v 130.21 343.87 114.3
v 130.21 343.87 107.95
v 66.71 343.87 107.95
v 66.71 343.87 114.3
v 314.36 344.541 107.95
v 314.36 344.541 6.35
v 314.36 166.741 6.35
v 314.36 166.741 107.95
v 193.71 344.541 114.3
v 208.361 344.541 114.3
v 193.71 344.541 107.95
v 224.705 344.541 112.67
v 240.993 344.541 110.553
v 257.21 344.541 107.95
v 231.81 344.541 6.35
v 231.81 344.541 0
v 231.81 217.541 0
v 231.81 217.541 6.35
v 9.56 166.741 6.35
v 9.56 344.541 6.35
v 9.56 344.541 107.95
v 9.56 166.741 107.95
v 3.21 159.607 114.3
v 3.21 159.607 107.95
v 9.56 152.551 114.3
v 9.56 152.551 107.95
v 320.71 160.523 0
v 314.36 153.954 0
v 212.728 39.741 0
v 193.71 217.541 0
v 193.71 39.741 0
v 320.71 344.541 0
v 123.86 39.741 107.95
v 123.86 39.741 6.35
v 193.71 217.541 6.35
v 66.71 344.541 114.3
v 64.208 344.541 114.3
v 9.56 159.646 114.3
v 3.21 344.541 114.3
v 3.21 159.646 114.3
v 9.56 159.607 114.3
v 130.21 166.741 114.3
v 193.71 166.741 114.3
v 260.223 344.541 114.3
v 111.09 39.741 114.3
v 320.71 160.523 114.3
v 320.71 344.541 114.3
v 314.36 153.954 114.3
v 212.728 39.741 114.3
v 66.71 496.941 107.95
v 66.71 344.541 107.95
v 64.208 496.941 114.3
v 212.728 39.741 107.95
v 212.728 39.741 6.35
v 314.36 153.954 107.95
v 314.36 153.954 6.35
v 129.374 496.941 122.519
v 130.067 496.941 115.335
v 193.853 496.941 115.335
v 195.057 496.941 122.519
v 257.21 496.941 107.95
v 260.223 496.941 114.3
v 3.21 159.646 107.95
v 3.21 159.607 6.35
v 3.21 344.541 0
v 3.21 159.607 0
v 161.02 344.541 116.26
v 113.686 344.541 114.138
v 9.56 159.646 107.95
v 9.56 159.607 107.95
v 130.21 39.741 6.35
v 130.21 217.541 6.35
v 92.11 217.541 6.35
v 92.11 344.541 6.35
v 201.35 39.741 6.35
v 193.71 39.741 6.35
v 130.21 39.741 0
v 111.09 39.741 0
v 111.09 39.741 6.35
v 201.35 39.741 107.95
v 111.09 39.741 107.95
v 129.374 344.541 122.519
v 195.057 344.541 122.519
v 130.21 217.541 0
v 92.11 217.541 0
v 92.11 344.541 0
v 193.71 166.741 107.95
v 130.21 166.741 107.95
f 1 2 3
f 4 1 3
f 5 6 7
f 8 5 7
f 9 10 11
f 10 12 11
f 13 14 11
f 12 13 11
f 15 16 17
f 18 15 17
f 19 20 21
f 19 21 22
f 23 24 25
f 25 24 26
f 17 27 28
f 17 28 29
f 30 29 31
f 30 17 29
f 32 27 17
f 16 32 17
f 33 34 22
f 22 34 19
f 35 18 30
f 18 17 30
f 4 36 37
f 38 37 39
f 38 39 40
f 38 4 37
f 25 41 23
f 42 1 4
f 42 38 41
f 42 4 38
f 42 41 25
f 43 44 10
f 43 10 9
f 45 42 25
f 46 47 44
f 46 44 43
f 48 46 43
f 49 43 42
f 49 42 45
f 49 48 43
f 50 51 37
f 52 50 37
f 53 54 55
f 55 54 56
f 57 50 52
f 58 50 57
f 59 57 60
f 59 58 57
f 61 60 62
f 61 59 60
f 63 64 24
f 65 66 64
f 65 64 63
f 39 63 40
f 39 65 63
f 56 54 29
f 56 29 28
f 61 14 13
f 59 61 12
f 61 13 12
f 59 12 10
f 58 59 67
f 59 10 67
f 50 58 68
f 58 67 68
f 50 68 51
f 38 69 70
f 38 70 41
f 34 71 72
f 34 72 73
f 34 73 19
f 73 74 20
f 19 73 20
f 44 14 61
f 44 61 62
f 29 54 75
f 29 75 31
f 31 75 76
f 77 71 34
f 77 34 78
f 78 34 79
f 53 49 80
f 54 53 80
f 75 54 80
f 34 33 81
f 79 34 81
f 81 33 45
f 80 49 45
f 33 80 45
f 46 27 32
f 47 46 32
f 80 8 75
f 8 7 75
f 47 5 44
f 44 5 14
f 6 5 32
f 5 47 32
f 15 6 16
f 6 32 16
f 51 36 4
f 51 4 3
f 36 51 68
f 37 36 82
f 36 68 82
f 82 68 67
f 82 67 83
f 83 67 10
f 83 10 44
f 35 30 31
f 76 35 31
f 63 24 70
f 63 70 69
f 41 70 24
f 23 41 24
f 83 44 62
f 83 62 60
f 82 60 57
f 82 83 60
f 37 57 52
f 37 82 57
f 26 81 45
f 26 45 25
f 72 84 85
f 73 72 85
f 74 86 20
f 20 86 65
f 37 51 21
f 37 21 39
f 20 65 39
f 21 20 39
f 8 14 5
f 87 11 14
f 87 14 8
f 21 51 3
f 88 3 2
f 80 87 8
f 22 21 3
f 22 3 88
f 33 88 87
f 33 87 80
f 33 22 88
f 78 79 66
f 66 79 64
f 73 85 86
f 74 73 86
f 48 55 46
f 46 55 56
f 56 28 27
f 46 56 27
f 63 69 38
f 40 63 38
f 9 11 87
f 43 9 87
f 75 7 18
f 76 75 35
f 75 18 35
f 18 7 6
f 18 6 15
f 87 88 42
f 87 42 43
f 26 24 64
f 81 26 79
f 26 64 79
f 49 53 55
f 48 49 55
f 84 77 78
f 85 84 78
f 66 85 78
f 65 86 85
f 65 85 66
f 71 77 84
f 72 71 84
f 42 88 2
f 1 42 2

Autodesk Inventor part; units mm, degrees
ref_plane "YZ Plane" through (0, 0, 0) normal (1, 0, 0) x (0, 1, 0)
ref_plane "XZ Plane" through (0, 0, 0) normal (0, 1, 0) x (-1, 0, 0)
ref_plane "XY Plane" through (0, 0, 0) normal (0, 0, 1) x (1, 0, 0)
sketch "Sketch1" plane through (0, 0, 0) normal (0, 0, 1) x (1, 0, 0)
  line L0 (9.560424, 344.540635) -> (9.560424, 166.740635)
  line L1 (9.560424, 166.740635) -> (123.860424, 39.740635)
  line L2 (123.860424, 39.740635) -> (130.210424, 39.740635)
  line L3 (130.210424, 39.740635) -> (130.210424, 217.540635)
  line L4 (130.210424, 217.540635) -> (92.110424, 217.540635)
  line L5 (92.110424, 217.540635) -> (92.110424, 344.540635)
  line L6 (92.110424, 344.540635) -> (9.560424, 344.540635)
  line L7 (193.710424, 217.540635) -> (193.710424, 39.740635)
  line L8 (193.710424, 39.740635) -> (200.060424, 39.740635)
  line L9 (200.060424, 39.740635) -> (314.360424, 166.740635)
  line L10 (314.360424, 166.740635) -> (314.360424, 344.540635)
  line L11 (314.360424, 344.540635) -> (231.810424, 344.540635)
  line L12 (231.810424, 344.540635) -> (231.810424, 217.540635)
  line L13 (231.810424, 217.540635) -> (193.710424, 217.540635)
  point P0 (0, 0)
  dimension "d0" = 127
  dimension "d1" = 38.1
  dimension "d2" = 177.8
  dimension "d3" = 127
  dimension "d4" = 82.55
  dimension "d5" = 6.35
  dimension "d9" = 63.5
  dimension "d10" = 38.1
  dimension "d11" = 82.55
  dimension "d12" = 6.35
  dimension "d13" = 177.8
  dimension "d14" = 170.86103
  dimension "d15" = 127
  dimension "d16" = 177.8
extrude "Extrusion1" add sketch "Sketch1" along normal blind 6.35
sketch "Sketch2" plane through (0, 0, 6.35) normal (0, 0, 1) x (1, 0, 0)
  line L0 (9.560424, 166.740635) -> (123.860424, 39.740635)
  line L1 (9.560424, 166.740635) -> (123.860424, 39.740635)
  line L2 (123.860424, 39.740635) -> (116.804868, 33.390635)
  line L3 (116.804868, 33.390635) -> (2.504868, 160.390635)
  line L4 (2.504868, 160.390635) -> (9.560424, 166.740635)
  line L5 (314.360424, 166.740635) -> (201.350031, 39.740635)
  line L6 (201.350031, 39.740635) -> (207.700031, 34.090115)
  line L7 (207.700031, 34.090115) -> (320.710424, 161.090115)
  line L8 (320.710424, 161.090115) -> (314.360424, 166.740635)
  line L9 (9.560424, 166.740635) -> (3.210424, 166.740635)
  line L10 (3.210424, 166.740635) -> (3.210424, 369.270371)
  line L11 (3.210424, 369.270371) -> (9.560424, 369.270371)
  line L12 (9.560424, 369.270371) -> (9.560424, 166.740635)
  line L13 (314.360424, 166.740635) -> (314.360424, 344.540635)
  line L14 (314.360424, 344.540635) -> (320.710424, 344.540635)
  line L15 (320.710424, 344.540635) -> (320.710424, 141.340635)
  line L16 (320.710424, 141.340635) -> (314.360424, 141.340635)
  line L17 (314.360424, 141.340635) -> (314.360424, 344.540635)
  point P0 (0, 0)
  dimension "d17" = 6.35
  dimension "d18" = 6.35
  dimension "d19" = 6.35
  dimension "d20" = 6.35
sketch "Sketch2 outline for Extrusion2" plane through (0, 0, 6.35) normal (0, 0, 1) x (1, 0, 0)
  line L0 (3.210424, 166.740635) -> (9.560424, 166.740635)
  line L1 (3.210424, 369.270371) -> (3.210424, 166.740635)
  line L2 (9.560424, 369.270371) -> (3.210424, 369.270371)
  line L3 (9.560424, 166.740635) -> (9.560424, 369.270371)
  line L4 (320.710424, 344.540635) -> (314.360424, 344.540635)
  line L5 (314.360424, 344.540635) -> (314.360424, 166.740635)
  line L6 (314.360424, 166.740635) -> (201.350031, 39.740635)
  line L7 (201.350031, 39.740635) -> (207.700031, 34.090115)
  line L8 (207.700031, 34.090115) -> (314.360424, 153.954046)
  line L9 (314.360424, 153.954046) -> (314.360424, 141.340635)
  line L10 (314.360424, 141.340635) -> (320.710424, 141.340635)
  line L11 (320.710424, 141.340635) -> (320.710424, 344.540635)
  line L12 (123.860424, 39.740635) -> (9.560424, 166.740635)
  line L13 (116.804868, 33.390635) -> (123.860424, 39.740635)
  line L14 (2.504868, 160.390635) -> (116.804868, 33.390635)
  line L15 (9.560424, 166.740635) -> (2.504868, 160.390635)
extrude "Extrusion2" add sketch "Sketch2 outline for Extrusion2" along normal blind 101.6
sketch "Sketch4" plane through (0, 0, 0) normal (0, 0, -1) x (-1, 0, 0)
  line L0 (-193.710424, 39.740635) -> (-200.060424, 39.740635)
  line L1 (-193.710424, 39.740635) -> (-216.217025, 39.740635)
  line L2 (-216.217025, 39.740635) -> (-216.217025, 32.649574)
  line L3 (-216.217025, 32.649574) -> (-193.710424, 32.649574)
  line L4 (-193.710424, 32.649574) -> (-193.710424, 39.740635)
  line L5 (-123.860424, 39.740635) -> (-130.210424, 39.740635)
  line L6 (-130.210424, 39.740635) -> (-108.923155, 39.740635)
  line L7 (-108.923155, 39.740635) -> (-108.923155, 31.510409)
  line L8 (-108.923155, 31.510409) -> (-130.210424, 31.510409)
  line L9 (-130.210424, 31.510409) -> (-130.210424, 39.740635)
  point P0 (0, 0)
  point P1 (-200.060424, 14.340635)
  point P2 (-123.860424, 14.340635)
extrude "Extrusion4" cut sketch "Sketch4" against normal blind 114.3
sketch "Sketch5" plane through (0, 0, 107.95) normal (0, 0, 1) x (1, 0, 0)
  line L0 (3.210424, 141.340635) -> (3.210424, 343.870371)
  line L1 (3.210424, 343.870371) -> (130.210424, 343.870371)
  line L2 (92.110424, 344.540635) -> (9.560424, 344.540635)
  line L3 (130.210424, 39.740635) -> (130.210424, 217.540635)
  line L4 (130.210424, 343.870371) -> (130.210424, 39.740635)
  line L5 (123.860424, 39.740635) -> (130.210424, 39.740635)
  line L6 (130.210424, 14.340635) -> (111.089868, 14.340635)
  line L7 (111.089868, 14.340635) -> (2.504868, 134.990635)
  line L8 (111.089868, 14.340635) -> (2.504868, 134.990635)
  line L9 (2.504868, 134.990635) -> (3.210424, 141.340635)
  line L10 (193.710424, 39.740635) -> (193.710424, 344.540635)
  line L11 (193.710424, 344.540635) -> (320.710424, 344.540635)
  line L12 (320.710424, 141.340635) -> (320.710424, 344.540635)
  line L13 (320.710424, 344.540635) -> (320.710424, 141.340635)
  line L14 (314.360424, 344.540635) -> (314.360424, 141.340635)
  line L15 (320.710424, 135.690115) -> (314.360424, 141.340635)
  line L16 (320.710424, 141.340635) -> (320.710424, 135.690115)
  line L17 (320.710424, 135.690115) -> (235.3302, 39.740635)
  line L18 (235.3302, 39.740635) -> (193.710424, 39.740635)
  point P0 (0, 0)
sketch "Sketch5 outline for Extrusion5" plane through (0, 0, 107.95) normal (0, 0, 1) x (1, 0, 0)
  line L0 (193.710424, 344.540635) -> (193.710424, 39.740635)
  line L1 (193.710424, 39.740635) -> (235.3302, 39.740635)
  line L2 (235.3302, 39.740635) -> (320.710424, 135.690115)
  line L3 (320.710424, 135.690115) -> (320.710424, 344.540635)
  line L4 (320.710424, 344.540635) -> (193.710424, 344.540635)
  line L5 (3.210424, 343.870371) -> (3.210424, 141.340635)
  line L6 (130.210424, 343.870371) -> (3.210424, 343.870371)
  line L7 (130.210424, 39.740635) -> (130.210424, 343.870371)
  line L8 (111.089868, 14.340635) -> (130.210424, 39.740635)
  line L9 (2.504868, 134.990635) -> (111.089868, 14.340635)
  line L10 (3.210424, 141.340635) -> (2.504868, 134.990635)
extrude "Extrusion5" add sketch "Sketch5 outline for Extrusion5" along normal blind 6.35
sketch "Sketch6" plane through (193.710424, 39.740635, 107.95) normal (-1, 0, 0) x (0, 0, 1)
  line L0 (0, 304.8) -> (0, 0) projected
  line L1 (6.35, 0) -> (-101.6, 0) projected
  line L2 (0, 101.6) -> (6.35, 101.6)
  line L3 (6.35, 101.6) -> (6.35, 0)
  line L4 (6.35, 0) -> (0, 0)
  line L5 (0, 0) -> (0, 101.6)
  point P0 (-107.95, -39.740635)
  point P1 (-107.95, 0)
  dimension "d29" = 101.6
extrude "Extrusion6" add sketch "Sketch6" along normal blind 63.5
sketch "Sketch7" plane through (0, 0, 0) normal (0, 0, -1) x (-1, 0, 0)
  line L0 (-3.210424, 343.870371) -> (-3.210424, 141.340635)
  line L1 (-3.210424, 147.802494) -> (-9.560424, 147.802494)
  line L2 (-9.560424, 147.802494) -> (-9.560424, 134.679374)
  line L3 (-9.560424, 134.679374) -> (-3.210424, 134.679374)
  line L4 (-3.210424, 134.679374) -> (-3.210424, 147.802494)
  line L5 (-314.360424, 166.740635) -> (-201.350031, 39.740635)
  line L6 (-320.714268, 135.664797) -> (-320.714268, 145.552556)
  line L7 (-320.738877, 135.664797) -> (-314.360424, 135.664797)
  line L8 (-314.360424, 135.664797) -> (-314.360424, 145.552556)
  line L9 (-314.360424, 166.740635) -> (-314.360424, 344.540635)
  line L10 (-320.714268, 145.552556) -> (-314.360424, 145.552556)
  line L11 (-320.738877, 135.664797) -> (-314.360424, 135.664797)
  line L12 (-314.360424, 135.664797) -> (-314.360424, 145.552556)
  line L13 (-314.360424, 145.552556) -> (-320.738877, 145.552556)
  line L14 (-320.738877, 145.552556) -> (-320.738877, 135.664797)
  point P0 (0, 0)
  point P1 (-309.309804, 161.064797)
  point P2 (-314.360424, 141.340635)
  point P3 (-201.350031, 39.740635)
sketch "Sketch8" plane through (0, 0, 0) normal (0, 0, -1) x (-1, 0, 0)
  line L0 (-3.210424, 141.340635) -> (-3.210424, 343.870371)
  line L1 (-3.210424, 141.825243) -> (-1.362602, 141.825243)
  line L2 (-1.362602, 141.825243) -> (-1.362602, 134.146464)
  line L3 (-1.362602, 134.146464) -> (-3.210424, 134.146464)
  line L4 (-3.210424, 134.146464) -> (-3.210424, 141.825243)
  point P0 (0, 0)
  point P1 (-3.210424, 135.625635)
extrude "Extrusion8" cut sketch "Sketch8" against normal blind 114.3
sketch "Sketch10" plane through (231.810424, 344.540635, 0) normal (0, 1, 0) x (1, 0, 0)
  line L0 (88.9, -114.3) -> (-38.1, -114.3)
  line L1 (-101.6, -114.3) -> (-228.6, -114.3)
  line L2 (-101.6, -107.95) -> (-222.25, -107.95)
  line L3 (82.55, -107.95) -> (-30.460392, -107.95)
  arc A0 (-165.1, -107.95) -> (25.4, -107.95) centre (-69.85, 433.719551) ccw
  line L4 (88.9, -6.35) -> (88.9, -114.3)
  line L5 (-228.6, -107.95) -> (-228.6, -114.3)
  line L6 (-165.1, -107.95) -> (-167.602477, -114.3)
  line L7 (25.4, -107.95) -> (28.412743, -114.3)
  line L8 (3.519776, -114.3) -> (88.9, -114.3)
  arc A1 (-167.602477, -114.3) -> (28.412743, -114.3) centre (-69.594867, 400.309912) ccw
  point P0 (-231.810424, 0)
  point P1 (-165.1, -114.3)
  point P2 (25.4, -114.3)
  point P3 (77.518866, -107.95)
  point P4 (88.9, 0)
  point P5 (-228.6, 0)
  point P6 (88.896956, -114.3)
  dimension "d38" = 190.5
  dimension "d39" = 63.5
  dimension "d40" = 63.5
  dimension "d44" = 63.5
  dimension "d45" = 63.5
extrude "Extrusion10" add sketch "Sketch10" along normal blind 152.4
extrude "Extrusion11" add sketch "Sketch7" against normal blind 114.3
sketch "Sketch11" plane through (193.710424, 141.340635, 114.3) normal (0, 1, 0) x (1, 0, 0)
  line L0 (0, 6.35) -> (0, 0)
  line L1 (-63.505152, 0) -> (0, 0)
  line L2 (0, 0) -> (0, 6.35)
  line L3 (0, 6.35) -> (-63.505152, 6.35)
  line L4 (-63.505152, 6.35) -> (-63.505152, 0)
  line L5 (0, 0) -> (-63.5, 0)
  point P0 (-193.710424, 114.3)
extrude "Extrusion12" add sketch "Sketch11" along normal blind 25.4
sketch "Sketch12" plane through (0, 0, 107.95) normal (0, 0, 1) x (1, 0, 0)
  line L0 (130.210424, 343.870371) -> (9.560424, 343.870371)
  line L1 (3.210424, 369.270371) -> (3.210424, 166.740635)
  line L2 (9.560424, 343.870371) -> (3.210424, 343.870371)
  line L3 (3.210424, 343.870371) -> (3.210424, 369.270371)
  line L4 (3.210424, 369.270371) -> (9.560424, 369.270371)
  line L5 (9.560424, 369.270371) -> (9.560424, 343.870371)
  point P0 (0, 0)
extrude "Extrusion13" cut sketch "Sketch12" against normal blind 114.3
sketch "Sketch13" plane through (3.210424, 166.740635, 6.35) normal (-1, 0, 0) x (0, 0, 1)
  line L0 (107.95, -32.533951) -> (107.95, -152.4)
  line L1 (-6.35, -18.909661) -> (107.95, -18.909661)
  line L2 (107.95, -18.909661) -> (107.95, -32.533951)
  line L3 (107.95, -32.533951) -> (-6.35, -32.533951)
  line L4 (-6.35, -32.533951) -> (-6.35, -18.909661)
  line L5 (101.6, -127) -> (101.6, 0)
  line L6 (101.6, 0) -> (107.95, 0)
  line L7 (107.95, 0) -> (107.95, -18.909661)
  line L8 (107.95, -18.909661) -> (101.6, -18.909661)
  line L9 (101.6, -18.909661) -> (101.6, 0)
  point P0 (-6.35, -166.740635)
extrude "Extrusion14" cut sketch "Sketch13" against normal blind 6.35
sketch "Sketch14" plane through (0, 0, 107.95) normal (0, 0, -1) x (-1, 0, 0)
  line L0 (-9.560424, 152.551129) -> (-9.560424, 166.740635)
  line L1 (-9.560424, 134.206684) -> (-3.210424, 134.206684)
  line L2 (-9.560424, 152.551129) -> (-9.560424, 134.206684)
  line L3 (-9.560424, 134.206684) -> (-3.210424, 134.206684)
  line L4 (-3.210424, 134.206684) -> (-111.089868, 14.340635)
  line L5 (-3.210424, 134.206684) -> (-111.089868, 14.340635)
  line L6 (-111.089868, 14.340635) -> (-130.210424, 39.740635)
  line L7 (-111.089868, 14.340635) -> (-130.210424, 39.740635)
  line L8 (-111.089868, 39.740635) -> (-123.860424, 39.740635)
  line L9 (-130.210424, 39.740635) -> (-111.089868, 39.740635)
  line L10 (-111.089868, 39.740635) -> (-9.560424, 152.551129)
  point P0 (0, 0)
extrude "Extrusion15" cut sketch "Sketch14" against normal blind 6.35
sketch "Sketch16" plane through (0, 0, 107.95) normal (0, 0, -1) x (-1, 0, 0)
  line L0 (-314.360424, 153.954046) -> (-314.360424, 145.552556)
  line L1 (-314.360424, 135.664797) -> (-314.360424, 145.552556)
  line L2 (-314.360424, 153.954046) -> (-314.360424, 135.664797)
  line L3 (-320.738877, 135.664797) -> (-314.360424, 135.664797)
  line L4 (-314.360424, 135.664797) -> (-320.738877, 135.664797)
  line L5 (-235.3302, 39.740635) -> (-320.687894, 135.664797)
  line L6 (-320.738877, 135.664797) -> (-235.381183, 39.740635)
  line L7 (-212.728121, 39.740635) -> (-314.360424, 153.954046)
  line L8 (-235.381183, 39.740635) -> (-212.728121, 39.740635)
  line L9 (-212.728121, 39.740635) -> (-314.360424, 153.954046)
  point P0 (0, 0)
extrude "Extrusion16" cut sketch "Sketch16" against normal blind 6.35
sketch "Sketch17" plane through (0, 0, 6.35) normal (0, 0, -1) x (-1, 0, 0)
  line L0 (-212.728121, 39.740635) -> (-314.360424, 153.954046)
  line L1 (-314.360424, 153.954046) -> (-320.710424, 160.522836)
  line L2 (-320.710424, 145.552556) -> (-320.710424, 344.540635)
  line L3 (-320.710424, 145.552556) -> (-314.360424, 145.552556)
  line L4 (-320.710424, 145.552556) -> (-314.360424, 145.552556)
  line L5 (-314.360424, 145.552556) -> (-314.360424, 153.954046)
  line L6 (-314.360424, 153.954046) -> (-314.360424, 135.664797)
  line L7 (-314.360424, 145.552556) -> (-320.710424, 145.552556)
  line L8 (-320.710424, 145.552556) -> (-320.710424, 153.954046)
  line L9 (-320.710424, 153.954046) -> (-314.360424, 153.954046)
  line L10 (-314.360424, 153.954046) -> (-314.360424, 145.552556)
  line L11 (-320.710424, 160.522836) -> (-314.360424, 153.954046)
  line L12 (-320.710424, 160.522836) -> (-320.710424, 153.954046)
  point P0 (0, 0)
extrude "Extrusion17" cut sketch "Sketch17" against normal blind 152.4
sketch "Sketch18" plane through (0, 0, 0) normal (0, 0, -1) x (-1, 0, 0)
  line L0 (-314.360424, 145.552556) -> (-320.738877, 145.552556)
  line L1 (-320.738877, 145.552556) -> (-314.360424, 145.552556)
  line L2 (-314.360424, 145.552556) -> (-314.360424, 135.51)
  line L3 (-314.360424, 135.51) -> (-320.738877, 135.51)
  line L4 (-320.738877, 135.51) -> (-320.738877, 145.552556)
  point P0 (0, 0)
extrude "Extrusion18" cut sketch "Sketch18" against normal blind 152.4
sketch "Sketch19" plane through (0, 0, 6.35) normal (0, 0, -1) x (-1, 0, 0)
  line L0 (-111.089868, 39.740635) -> (-212.728121, 39.740635)
  line L1 (-124.141437, 39.740635) -> (-111.089868, 39.740635)
  line L2 (-9.560424, 343.870371) -> (-9.560424, 166.740635)
  line L3 (-9.560424, 343.870371) -> (-3.073851, 343.870371)
  line L4 (-3.073851, 343.870371) -> (-3.073851, 166.740635)
  line L5 (-3.073851, 166.740635) -> (-9.560424, 166.740635)
  line L6 (-9.560424, 166.740635) -> (-9.560424, 343.870371)
  line L7 (-314.360424, 166.740635) -> (-314.360424, 344.540635)
  line L8 (-314.360424, 153.954046) -> (-320.710424, 160.522836)
  line L9 (-314.360424, 344.540635) -> (-320.710424, 344.540635)
  line L10 (-320.710424, 344.540635) -> (-320.710424, 160.522836)
  line L11 (-320.710424, 160.522836) -> (-314.360424, 160.522836)
  line L12 (-314.360424, 160.522836) -> (-314.360424, 344.540635)
  line L13 (-200.060424, 39.740635) -> (-314.360424, 166.740635)
  line L14 (-314.360424, 166.740635) -> (-314.360424, 160.522836)
  line L15 (-314.360424, 160.522836) -> (-320.710424, 160.522836)
  line L16 (-212.728121, 39.740635) -> (-314.360424, 153.954046)
  line L17 (-320.710424, 160.522836) -> (-320.710424, 344.540635)
  line L18 (-320.710424, 160.522836) -> (-212.728121, 39.740635)
  line L19 (-212.728121, 39.740635) -> (-200.060424, 39.740635)
  line L20 (-200.060424, 39.740635) -> (-314.360424, 166.740635)
  point P0 (0, 0)
extrude "Extrusion19" add sketch "Sketch19" along normal blind 6.35 contours L0 L16 L8 L11 L12 L13 | L12 L11 L10 L9 L7
sketch "Sketch20" plane through (0, 0, 6.35) normal (0, 0, -1) x (-1, 0, 0)
  line L0 (-9.560424, 166.740635) -> (-2.504868, 160.390635)
  line L1 (-9.560424, 160.390635) -> (-9.560424, 175.559995)
  line L2 (-3.210424, 343.870371) -> (-3.210424, 166.740635)
  line L3 (-9.560424, 166.740635) -> (-9.560424, 152.551129)
  line L4 (-3.210424, 176.563666) -> (-9.560424, 176.563666)
  line L5 (-9.560424, 176.563666) -> (-9.560424, 159.645882)
  line L6 (-9.560424, 159.645882) -> (-3.210424, 159.645882)
  line L7 (-3.210424, 159.645882) -> (-3.210424, 176.563666)
  point P0 (0, 0)
extrude "Extrusion20" add sketch "Sketch20" against normal blind 152.4
sketch "Sketch21" plane through (0, 0, 6.35) normal (0, 0, -1) x (-1, 0, 0)
  line L0 (-3.210424, 161.025635) -> (-2.504868, 160.390635)
  line L1 (-3.210424, 161.025635) -> (-2.32353, 161.025635)
  line L2 (-2.32353, 161.025635) -> (-2.32353, 159.41775)
  line L3 (-2.32353, 159.41775) -> (-3.210424, 159.41775)
  line L4 (-3.210424, 159.41775) -> (-3.210424, 161.025635)
  point P0 (0, 0)
extrude "Extrusion21" cut sketch "Sketch21" against normal blind 152.4
sketch "Sketch22" plane through (3.210424, 176.563666, 114.3) normal (0, 1, 0) x (1, 0, 0)
  line L0 (0, 6.35) -> (0, -44.45)
  line L1 (0, -44.45) -> (6.35, -44.45)
  line L2 (0, 0.054609) -> (6.35, 0.054609)
  line L3 (6.35, 0.054609) -> (6.35, -44.45)
  line L4 (6.35, -44.45) -> (0, -44.45)
  line L5 (0, -44.45) -> (0, 0.054609)
  point P0 (-3.210424, 114.3)
extrude "Extrusion22" cut sketch "Sketch22" against normal blind 25.4
sketch "Sketch23" plane through (0, 0, 107.95) normal (0, 0, 1) x (1, 0, 0)
  line L0 (3.176222, 159.644687) -> (9.515247, 152.601326)
  line L1 (3.210424, 159.606684) -> (111.089868, 39.740635)
  line L2 (9.560424, 159.645882) -> (3.210424, 159.645882)
  line L3 (9.560424, 159.645882) -> (3.175146, 159.645882)
  line L4 (3.175146, 159.645882) -> (9.560424, 159.606684)
  line L5 (9.560424, 152.551129) -> (9.560424, 159.645882)
  line L6 (9.560424, 159.606684) -> (9.560424, 152.551129)
  line L7 (9.560424, 152.551129) -> (3.210424, 159.606684)
  line L8 (9.560424, 159.606684) -> (3.210424, 159.606684)
  line L9 (3.210424, 159.606684) -> (3.210424, 152.551129)
  line L10 (3.210424, 152.551129) -> (9.560424, 152.551129)
  line L11 (9.560424, 152.551129) -> (9.560424, 159.606684)
  point P0 (0, 0)
extrude "Extrusion23" add sketch "Sketch23" along normal blind 6.35 contours L8 L5 L1 L0 | L0 L1 L10 L9
sketch "Sketch24" plane through (3.210424, 176.563666, 114.245391) normal (0, 0, 1) x (1, 0, 0)
  line L0 (6.35, 0) -> (6.35, -16.917784)
  line L1 (0, 0) -> (6.35, 0)
  line L2 (6.35, 0) -> (6.35, -16.917784)
  line L3 (6.35, -16.917784) -> (0, -16.917784)
  line L4 (0, -16.917784) -> (0, 0)
  point P0 (-3.210424, -176.563666)
sketch "Sketch25" plane through (0, 0, 107.95) normal (0, 0, -1) x (-1, 0, 0)
  line L0 (-3.210424, 159.606684) -> (-111.089868, 39.740635)
  line L1 (-3.210424, 159.606684) -> (-9.560424, 152.551129)
  line L2 (-3.210424, 152.551129) -> (-9.560424, 152.551129)
  line L3 (-3.210424, 152.551129) -> (-3.210424, 159.606684)
  line L4 (-3.210424, 159.606684) -> (-3.210424, 152.551129)
  line L5 (-9.560424, 152.551129) -> (-3.210424, 152.551129)
  line L6 (-9.560424, 159.645882) -> (-3.210424, 159.645882)
  line L7 (-3.210424, 159.645882) -> (-9.560424, 152.551129)
  point P0 (0, 0)
extrude "Extrusion24" cut sketch "Sketch25" against normal blind 25.4
sketch "Sketch26" plane through (0, 0, 6.35) normal (0, 0, -1) x (-1, 0, 0)
  line L0 (-123.860424, 39.740635) -> (-9.560424, 166.740635)
  line L1 (-111.089868, 39.740635) -> (-212.728121, 39.740635)
  line L2 (-123.860424, 39.740635) -> (-111.089868, 39.740635)
  line L3 (-3.210424, 159.606684) -> (-111.089868, 39.740635)
  line L4 (-111.089868, 39.740635) -> (-3.210424, 159.606684)
  line L5 (-3.210424, 159.606684) -> (-3.210424, 343.870371)
  line L6 (-3.210424, 159.606684) -> (-3.210424, 343.870371)
  line L7 (-3.210424, 343.870371) -> (-9.560424, 343.870371)
  line L8 (-130.210424, 343.870371) -> (-3.210424, 343.870371)
  line L9 (-9.560424, 344.540635) -> (-9.560424, 166.740635)
  line L10 (-9.560424, 166.740635) -> (-9.560424, 344.540635)
  line L11 (-3.210424, 159.606684) -> (-9.560424, 166.740635)
  line L12 (-9.560424, 166.740635) -> (-3.210424, 166.740635)
  point P0 (0, 0)
sketch "Sketch26 outline for Extrusion25" plane through (0, 0, 6.35) normal (0, 0, -1) x (-1, 0, 0)
  line L0 (-9.560424, 166.740635) -> (-123.860424, 39.740635)
  line L1 (-123.860424, 39.740635) -> (-111.089868, 39.740635)
  line L2 (-111.089868, 39.740635) -> (-3.210424, 159.606684)
  line L3 (-3.210424, 159.606684) -> (-3.210424, 166.740635)
  line L4 (-3.210424, 166.740635) -> (-9.560424, 166.740635)
extrude "Extrusion25" add sketch "Sketch26 outline for Extrusion25" along normal blind 6.35
sketch "Sketch27" plane through (0, 0, 6.35) normal (0, 0, -1) x (-1, 0, 0)
  line L0 (-3.210424, 159.606684) -> (-3.210424, 166.740635)
  line L1 (-9.560424, 344.540635) -> (-9.560424, 166.740635)
  line L2 (-3.210424, 166.740635) -> (-9.560424, 166.740635)
  line L3 (-9.560424, 166.740635) -> (-9.560424, 344.540635)
  line L4 (-9.560424, 344.540635) -> (-3.210424, 344.540635)
  line L5 (-3.210424, 344.540635) -> (-3.210424, 166.740635)
  point P0 (0, 0)
extrude "Extrusion26" add sketch "Sketch27" along normal blind 6.35
sketch "Sketch28" plane through (0, 0, 6.35) normal (0, 0, 1) x (1, 0, 0)
  line L0 (92.110424, 344.540635) -> (3.210424, 344.540635)
  line L1 (9.560424, 343.870371) -> (3.210424, 343.870371)
  line L2 (3.210424, 343.870371) -> (3.210424, 344.540635)
  line L3 (3.210424, 344.540635) -> (9.560424, 344.540635)
  line L4 (9.560424, 344.540635) -> (9.560424, 343.870371)
  point P0 (0, 0)
extrude "Extrusion27" add sketch "Sketch28" along normal blind 107.95
sketch "Sketch29" plane through (9.560424, 166.740635, 6.35) normal (1, 0, 0) x (0, 0, -1)
  line L0 (-101.6, 0) -> (-101.6, 177.129736)
  line L1 (0, 177.8) -> (-107.95, 177.8)
  line L2 (-101.6, 177.129736) -> (-107.95, 177.129736)
  line L3 (-107.95, 177.129736) -> (-107.95, 177.8)
  line L4 (-107.95, 177.8) -> (-101.6, 177.8)
  line L5 (-101.6, 177.8) -> (-101.6, 177.129736)
  point P0 (6.35, -166.740635)
extrude "Extrusion28" add sketch "Sketch29" along normal blind 57.15
sketch "Sketch30" plane through (9.560424, 166.740635, 6.35) normal (-1, 0, 0) x (0, 0, 1)
  line L0 (101.6, -7.094753) -> (107.895391, -7.094753)
  line L1 (101.6, -7.133951) -> (107.95, -7.133951)
  line L2 (101.6, -7.094753) -> (107.95, -7.094753)
  line L3 (107.95, -7.094753) -> (107.95, -7.133951)
  line L4 (107.95, -7.133951) -> (101.6, -7.133951)
  line L5 (101.6, -7.133951) -> (101.6, -7.094753)
  line L6 (107.895391, 9.823031) -> (107.95, 9.823031)
  line L7 (107.95, -7.094753) -> (107.895391, -7.094753)
  line L8 (107.895391, -7.094753) -> (107.895391, 9.823031)
  line L9 (107.895391, 9.823031) -> (107.95, 9.823031)
  line L10 (107.95, 9.823031) -> (107.95, -7.094753)
  point P0 (-6.35, -166.740635)
extrude "Extrusion29" add sketch "Sketch30" along normal blind 6.35 contours L8 L6 L10 L2
properties part number "full gear cad"
